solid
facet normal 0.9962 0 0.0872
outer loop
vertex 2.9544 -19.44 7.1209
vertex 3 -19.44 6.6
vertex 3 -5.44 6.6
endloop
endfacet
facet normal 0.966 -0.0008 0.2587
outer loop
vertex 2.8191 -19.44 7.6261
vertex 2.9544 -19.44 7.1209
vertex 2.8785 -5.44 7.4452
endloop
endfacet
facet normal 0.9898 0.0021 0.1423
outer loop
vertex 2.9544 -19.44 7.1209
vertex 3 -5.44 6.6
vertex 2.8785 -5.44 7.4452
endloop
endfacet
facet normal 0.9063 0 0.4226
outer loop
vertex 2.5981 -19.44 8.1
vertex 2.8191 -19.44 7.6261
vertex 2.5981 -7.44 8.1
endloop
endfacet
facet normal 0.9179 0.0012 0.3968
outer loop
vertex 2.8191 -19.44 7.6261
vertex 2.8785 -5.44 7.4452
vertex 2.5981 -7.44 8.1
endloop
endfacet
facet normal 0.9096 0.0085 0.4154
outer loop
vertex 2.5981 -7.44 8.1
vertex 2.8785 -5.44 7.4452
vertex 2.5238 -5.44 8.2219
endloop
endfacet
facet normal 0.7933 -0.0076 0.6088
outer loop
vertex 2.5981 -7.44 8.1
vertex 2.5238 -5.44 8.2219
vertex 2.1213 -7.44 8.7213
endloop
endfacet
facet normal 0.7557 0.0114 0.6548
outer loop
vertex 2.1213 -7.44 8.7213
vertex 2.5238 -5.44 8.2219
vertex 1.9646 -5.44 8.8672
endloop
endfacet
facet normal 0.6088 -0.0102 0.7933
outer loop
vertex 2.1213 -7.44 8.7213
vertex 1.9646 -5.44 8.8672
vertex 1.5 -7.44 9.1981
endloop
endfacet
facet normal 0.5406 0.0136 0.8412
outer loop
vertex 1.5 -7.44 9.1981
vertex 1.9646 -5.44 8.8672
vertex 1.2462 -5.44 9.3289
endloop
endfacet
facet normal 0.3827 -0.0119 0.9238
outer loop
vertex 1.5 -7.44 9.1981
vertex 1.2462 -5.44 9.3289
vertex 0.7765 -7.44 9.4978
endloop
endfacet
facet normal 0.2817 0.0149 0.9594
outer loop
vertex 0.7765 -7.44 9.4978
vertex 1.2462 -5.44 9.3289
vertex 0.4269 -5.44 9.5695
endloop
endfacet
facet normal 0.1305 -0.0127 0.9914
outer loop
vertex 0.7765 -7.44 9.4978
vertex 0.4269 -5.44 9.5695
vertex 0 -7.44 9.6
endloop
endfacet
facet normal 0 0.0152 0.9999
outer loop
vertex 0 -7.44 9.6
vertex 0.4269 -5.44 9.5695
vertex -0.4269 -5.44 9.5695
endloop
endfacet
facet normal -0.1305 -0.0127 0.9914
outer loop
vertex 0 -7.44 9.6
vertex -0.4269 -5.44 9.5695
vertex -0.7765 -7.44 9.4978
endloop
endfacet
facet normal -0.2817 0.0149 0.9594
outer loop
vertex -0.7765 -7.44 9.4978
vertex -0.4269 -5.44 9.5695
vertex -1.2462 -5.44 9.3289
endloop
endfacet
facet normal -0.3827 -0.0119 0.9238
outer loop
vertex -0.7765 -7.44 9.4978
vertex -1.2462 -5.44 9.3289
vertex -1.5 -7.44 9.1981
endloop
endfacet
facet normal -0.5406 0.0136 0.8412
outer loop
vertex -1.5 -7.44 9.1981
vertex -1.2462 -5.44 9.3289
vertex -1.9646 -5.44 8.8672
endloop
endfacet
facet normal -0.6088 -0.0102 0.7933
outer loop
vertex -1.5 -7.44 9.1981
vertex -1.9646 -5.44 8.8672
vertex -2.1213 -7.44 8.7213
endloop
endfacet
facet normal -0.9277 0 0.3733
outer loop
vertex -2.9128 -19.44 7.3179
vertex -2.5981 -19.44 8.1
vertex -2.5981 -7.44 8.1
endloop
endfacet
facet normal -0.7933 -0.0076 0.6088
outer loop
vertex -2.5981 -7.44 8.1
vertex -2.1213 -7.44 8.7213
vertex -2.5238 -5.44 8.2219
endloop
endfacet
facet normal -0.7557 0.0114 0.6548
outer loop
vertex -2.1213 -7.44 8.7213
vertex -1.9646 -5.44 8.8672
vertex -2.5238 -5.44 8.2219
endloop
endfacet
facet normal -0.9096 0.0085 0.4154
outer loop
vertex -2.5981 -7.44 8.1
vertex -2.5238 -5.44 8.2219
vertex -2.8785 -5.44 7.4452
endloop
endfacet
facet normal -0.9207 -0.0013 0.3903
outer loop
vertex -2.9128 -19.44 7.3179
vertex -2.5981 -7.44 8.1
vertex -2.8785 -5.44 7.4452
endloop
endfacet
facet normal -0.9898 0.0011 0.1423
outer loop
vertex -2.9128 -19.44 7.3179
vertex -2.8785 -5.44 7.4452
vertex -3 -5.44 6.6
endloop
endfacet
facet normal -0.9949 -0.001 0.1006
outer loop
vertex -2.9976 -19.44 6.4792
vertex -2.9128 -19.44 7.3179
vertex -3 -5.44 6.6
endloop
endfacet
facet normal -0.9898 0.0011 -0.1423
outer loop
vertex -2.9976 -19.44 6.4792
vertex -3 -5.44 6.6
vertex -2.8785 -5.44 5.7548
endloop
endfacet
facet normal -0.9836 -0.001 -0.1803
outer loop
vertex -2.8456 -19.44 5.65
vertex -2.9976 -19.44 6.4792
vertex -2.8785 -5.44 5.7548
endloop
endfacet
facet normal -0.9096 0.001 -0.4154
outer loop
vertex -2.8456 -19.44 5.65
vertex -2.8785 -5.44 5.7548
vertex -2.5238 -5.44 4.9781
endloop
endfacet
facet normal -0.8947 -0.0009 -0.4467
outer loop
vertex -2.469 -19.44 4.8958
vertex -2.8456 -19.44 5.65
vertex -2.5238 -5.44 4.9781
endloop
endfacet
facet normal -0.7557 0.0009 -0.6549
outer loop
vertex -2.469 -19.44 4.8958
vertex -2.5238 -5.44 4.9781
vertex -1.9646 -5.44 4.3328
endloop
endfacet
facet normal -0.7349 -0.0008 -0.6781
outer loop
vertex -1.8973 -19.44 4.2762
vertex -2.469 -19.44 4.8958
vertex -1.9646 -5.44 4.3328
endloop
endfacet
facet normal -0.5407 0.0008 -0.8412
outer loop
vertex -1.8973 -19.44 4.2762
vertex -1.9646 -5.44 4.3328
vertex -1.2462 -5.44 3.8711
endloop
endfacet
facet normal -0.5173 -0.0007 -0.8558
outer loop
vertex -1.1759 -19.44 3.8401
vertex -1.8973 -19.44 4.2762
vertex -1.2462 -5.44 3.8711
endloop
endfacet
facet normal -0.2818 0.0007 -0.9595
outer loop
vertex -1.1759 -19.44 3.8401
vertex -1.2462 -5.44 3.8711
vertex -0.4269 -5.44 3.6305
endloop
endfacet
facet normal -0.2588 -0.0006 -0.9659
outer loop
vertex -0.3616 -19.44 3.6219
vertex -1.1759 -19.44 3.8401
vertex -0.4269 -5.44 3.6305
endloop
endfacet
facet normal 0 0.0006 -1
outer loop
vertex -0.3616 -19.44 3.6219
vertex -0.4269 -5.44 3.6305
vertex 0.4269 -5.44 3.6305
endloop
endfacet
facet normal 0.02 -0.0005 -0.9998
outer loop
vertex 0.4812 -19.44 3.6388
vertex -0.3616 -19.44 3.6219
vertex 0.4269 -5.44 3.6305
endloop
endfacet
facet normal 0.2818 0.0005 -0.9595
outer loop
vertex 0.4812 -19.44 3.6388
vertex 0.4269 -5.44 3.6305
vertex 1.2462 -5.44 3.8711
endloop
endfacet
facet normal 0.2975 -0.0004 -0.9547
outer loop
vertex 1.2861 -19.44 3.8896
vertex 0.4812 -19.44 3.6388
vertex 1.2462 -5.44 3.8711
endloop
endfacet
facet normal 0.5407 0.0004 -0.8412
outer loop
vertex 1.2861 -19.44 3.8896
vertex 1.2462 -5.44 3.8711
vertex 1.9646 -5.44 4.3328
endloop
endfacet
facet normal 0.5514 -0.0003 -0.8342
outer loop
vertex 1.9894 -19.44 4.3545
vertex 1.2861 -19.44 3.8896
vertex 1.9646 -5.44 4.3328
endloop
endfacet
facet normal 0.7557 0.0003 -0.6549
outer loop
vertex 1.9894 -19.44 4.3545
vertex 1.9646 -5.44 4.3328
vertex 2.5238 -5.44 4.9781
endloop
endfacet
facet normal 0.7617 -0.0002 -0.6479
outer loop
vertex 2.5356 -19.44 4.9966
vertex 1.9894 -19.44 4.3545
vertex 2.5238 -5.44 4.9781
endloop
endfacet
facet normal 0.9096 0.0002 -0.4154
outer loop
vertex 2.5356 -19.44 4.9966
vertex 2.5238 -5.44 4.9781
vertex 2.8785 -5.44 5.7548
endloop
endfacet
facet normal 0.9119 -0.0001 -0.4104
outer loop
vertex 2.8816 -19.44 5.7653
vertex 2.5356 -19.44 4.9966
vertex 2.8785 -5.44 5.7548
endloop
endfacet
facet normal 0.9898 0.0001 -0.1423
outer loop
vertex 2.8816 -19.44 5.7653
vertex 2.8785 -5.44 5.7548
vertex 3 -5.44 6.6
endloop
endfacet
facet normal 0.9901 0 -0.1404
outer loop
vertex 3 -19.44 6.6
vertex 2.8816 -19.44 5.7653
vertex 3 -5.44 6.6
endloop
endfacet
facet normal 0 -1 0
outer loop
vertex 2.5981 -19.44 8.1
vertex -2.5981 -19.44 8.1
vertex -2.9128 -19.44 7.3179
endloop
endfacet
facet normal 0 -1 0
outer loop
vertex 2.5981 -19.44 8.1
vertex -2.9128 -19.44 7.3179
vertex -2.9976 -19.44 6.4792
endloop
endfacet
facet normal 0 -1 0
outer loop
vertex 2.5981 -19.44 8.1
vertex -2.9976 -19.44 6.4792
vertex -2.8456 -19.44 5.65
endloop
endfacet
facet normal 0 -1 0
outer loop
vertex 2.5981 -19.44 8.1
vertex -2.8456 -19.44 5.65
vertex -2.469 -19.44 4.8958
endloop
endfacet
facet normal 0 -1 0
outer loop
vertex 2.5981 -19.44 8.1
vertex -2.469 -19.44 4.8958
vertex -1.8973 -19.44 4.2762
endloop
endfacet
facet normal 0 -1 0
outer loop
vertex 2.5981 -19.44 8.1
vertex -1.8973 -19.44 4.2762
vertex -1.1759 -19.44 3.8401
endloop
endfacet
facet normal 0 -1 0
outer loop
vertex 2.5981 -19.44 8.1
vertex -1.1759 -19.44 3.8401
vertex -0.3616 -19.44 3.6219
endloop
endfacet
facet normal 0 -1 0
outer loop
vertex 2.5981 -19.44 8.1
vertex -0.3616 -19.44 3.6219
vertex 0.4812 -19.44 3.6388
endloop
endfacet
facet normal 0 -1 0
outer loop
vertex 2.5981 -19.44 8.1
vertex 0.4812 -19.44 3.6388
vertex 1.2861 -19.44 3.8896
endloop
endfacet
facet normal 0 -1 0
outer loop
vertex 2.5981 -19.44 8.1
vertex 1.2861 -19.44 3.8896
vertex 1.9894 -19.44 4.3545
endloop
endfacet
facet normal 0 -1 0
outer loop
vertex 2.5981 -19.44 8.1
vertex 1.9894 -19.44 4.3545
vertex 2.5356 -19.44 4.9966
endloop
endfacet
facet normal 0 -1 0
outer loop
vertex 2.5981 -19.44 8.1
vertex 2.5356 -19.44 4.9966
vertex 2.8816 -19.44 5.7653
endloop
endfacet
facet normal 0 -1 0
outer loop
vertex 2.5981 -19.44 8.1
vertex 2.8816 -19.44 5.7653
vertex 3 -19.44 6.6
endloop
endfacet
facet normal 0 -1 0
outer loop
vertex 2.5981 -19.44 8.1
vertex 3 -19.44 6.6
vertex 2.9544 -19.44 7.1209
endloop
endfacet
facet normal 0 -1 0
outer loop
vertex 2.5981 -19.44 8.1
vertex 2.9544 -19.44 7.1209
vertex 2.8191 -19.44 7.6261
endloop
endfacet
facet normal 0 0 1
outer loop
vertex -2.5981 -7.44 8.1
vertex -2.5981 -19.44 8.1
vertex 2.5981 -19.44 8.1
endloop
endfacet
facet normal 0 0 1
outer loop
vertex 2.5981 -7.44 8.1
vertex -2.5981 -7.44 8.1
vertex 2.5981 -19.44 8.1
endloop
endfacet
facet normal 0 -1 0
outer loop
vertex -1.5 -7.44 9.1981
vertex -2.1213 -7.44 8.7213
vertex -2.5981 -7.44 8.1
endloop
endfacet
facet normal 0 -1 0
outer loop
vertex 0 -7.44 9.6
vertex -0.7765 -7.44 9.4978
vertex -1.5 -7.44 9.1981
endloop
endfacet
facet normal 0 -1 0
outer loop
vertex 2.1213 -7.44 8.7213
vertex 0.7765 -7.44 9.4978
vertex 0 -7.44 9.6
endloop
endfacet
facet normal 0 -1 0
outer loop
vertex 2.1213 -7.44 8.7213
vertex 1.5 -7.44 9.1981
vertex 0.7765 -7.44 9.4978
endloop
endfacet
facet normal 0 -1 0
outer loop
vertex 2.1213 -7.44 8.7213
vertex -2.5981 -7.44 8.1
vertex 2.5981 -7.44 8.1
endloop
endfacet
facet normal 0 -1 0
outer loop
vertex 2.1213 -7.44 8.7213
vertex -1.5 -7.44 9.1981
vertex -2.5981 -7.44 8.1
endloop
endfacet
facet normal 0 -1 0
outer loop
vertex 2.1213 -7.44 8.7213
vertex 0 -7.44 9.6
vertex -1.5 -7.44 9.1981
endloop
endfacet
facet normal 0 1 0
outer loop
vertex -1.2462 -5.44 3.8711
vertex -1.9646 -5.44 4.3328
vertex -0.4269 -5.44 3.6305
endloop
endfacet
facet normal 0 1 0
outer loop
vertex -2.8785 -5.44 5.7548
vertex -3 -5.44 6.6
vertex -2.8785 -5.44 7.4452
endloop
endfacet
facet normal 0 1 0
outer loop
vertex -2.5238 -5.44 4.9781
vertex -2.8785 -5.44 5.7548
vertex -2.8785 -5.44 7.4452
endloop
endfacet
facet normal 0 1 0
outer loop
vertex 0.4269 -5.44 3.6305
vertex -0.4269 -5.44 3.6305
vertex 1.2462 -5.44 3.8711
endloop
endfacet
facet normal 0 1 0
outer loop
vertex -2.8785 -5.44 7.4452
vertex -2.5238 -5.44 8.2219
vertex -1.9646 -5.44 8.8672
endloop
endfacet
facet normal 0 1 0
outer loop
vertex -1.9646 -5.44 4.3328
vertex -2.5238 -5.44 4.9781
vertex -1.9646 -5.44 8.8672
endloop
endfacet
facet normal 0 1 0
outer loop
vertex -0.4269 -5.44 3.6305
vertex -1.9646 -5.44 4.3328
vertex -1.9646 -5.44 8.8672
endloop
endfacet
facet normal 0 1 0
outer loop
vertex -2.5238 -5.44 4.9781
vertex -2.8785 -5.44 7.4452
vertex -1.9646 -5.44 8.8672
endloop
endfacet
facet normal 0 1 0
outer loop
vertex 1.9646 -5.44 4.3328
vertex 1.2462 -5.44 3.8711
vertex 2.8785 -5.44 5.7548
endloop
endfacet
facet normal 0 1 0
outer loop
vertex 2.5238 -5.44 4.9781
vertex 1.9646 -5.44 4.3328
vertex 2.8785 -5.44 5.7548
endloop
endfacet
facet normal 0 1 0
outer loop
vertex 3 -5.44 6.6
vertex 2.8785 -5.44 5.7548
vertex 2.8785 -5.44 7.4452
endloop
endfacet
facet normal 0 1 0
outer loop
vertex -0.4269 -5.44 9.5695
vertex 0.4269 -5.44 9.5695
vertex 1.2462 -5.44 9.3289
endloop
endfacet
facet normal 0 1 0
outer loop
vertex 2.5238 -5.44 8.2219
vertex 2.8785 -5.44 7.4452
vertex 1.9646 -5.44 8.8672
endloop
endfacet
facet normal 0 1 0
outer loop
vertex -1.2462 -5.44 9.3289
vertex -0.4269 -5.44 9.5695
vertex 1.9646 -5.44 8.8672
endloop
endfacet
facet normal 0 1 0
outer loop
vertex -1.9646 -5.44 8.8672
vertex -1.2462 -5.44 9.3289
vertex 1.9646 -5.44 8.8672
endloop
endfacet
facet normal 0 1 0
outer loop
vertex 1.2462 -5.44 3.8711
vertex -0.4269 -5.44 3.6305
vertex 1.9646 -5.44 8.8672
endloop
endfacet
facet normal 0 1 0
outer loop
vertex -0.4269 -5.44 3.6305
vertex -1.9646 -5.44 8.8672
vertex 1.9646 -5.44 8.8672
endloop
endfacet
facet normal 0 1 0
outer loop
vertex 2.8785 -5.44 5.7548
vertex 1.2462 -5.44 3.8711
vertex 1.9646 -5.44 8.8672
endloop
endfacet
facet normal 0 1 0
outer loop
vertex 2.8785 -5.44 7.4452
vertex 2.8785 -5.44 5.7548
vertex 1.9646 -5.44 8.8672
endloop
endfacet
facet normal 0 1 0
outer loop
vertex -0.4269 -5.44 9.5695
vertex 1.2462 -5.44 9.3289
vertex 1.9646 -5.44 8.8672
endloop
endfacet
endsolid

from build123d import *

# Parameters (mm, degrees)
BOX014_W          = 6
BOX014_H          = 1.5
BOX014_DEPTH      = 12
CYLINDER005_R     = 3
CYLINDER005_DEPTH = 14


with BuildPart() as cube:
    # Box014 → Box014 (new body)
    with BuildSketch(Plane(origin=(-3, -7.44, 8.1), x_dir=(1, 0, 0), z_dir=(0, -1, 0))):
        with Locations((3, 0.75)):
            Rectangle(BOX014_W, BOX014_H)
    extrude(amount=BOX014_DEPTH)


with BuildPart() as shaft:
    # Cylinder005 → Cylinder005 (new body)
    with BuildSketch(Plane(origin=(0, -5.44, 6.6), x_dir=(1, 0, 0), z_dir=(0, -1, 0))):
        Circle(CYLINDER005_R)
    extrude(amount=CYLINDER005_DEPTH)

    # Cut: cut Cube
    add(cube.part, mode=Mode.SUBTRACT)


solid = shaft.part
